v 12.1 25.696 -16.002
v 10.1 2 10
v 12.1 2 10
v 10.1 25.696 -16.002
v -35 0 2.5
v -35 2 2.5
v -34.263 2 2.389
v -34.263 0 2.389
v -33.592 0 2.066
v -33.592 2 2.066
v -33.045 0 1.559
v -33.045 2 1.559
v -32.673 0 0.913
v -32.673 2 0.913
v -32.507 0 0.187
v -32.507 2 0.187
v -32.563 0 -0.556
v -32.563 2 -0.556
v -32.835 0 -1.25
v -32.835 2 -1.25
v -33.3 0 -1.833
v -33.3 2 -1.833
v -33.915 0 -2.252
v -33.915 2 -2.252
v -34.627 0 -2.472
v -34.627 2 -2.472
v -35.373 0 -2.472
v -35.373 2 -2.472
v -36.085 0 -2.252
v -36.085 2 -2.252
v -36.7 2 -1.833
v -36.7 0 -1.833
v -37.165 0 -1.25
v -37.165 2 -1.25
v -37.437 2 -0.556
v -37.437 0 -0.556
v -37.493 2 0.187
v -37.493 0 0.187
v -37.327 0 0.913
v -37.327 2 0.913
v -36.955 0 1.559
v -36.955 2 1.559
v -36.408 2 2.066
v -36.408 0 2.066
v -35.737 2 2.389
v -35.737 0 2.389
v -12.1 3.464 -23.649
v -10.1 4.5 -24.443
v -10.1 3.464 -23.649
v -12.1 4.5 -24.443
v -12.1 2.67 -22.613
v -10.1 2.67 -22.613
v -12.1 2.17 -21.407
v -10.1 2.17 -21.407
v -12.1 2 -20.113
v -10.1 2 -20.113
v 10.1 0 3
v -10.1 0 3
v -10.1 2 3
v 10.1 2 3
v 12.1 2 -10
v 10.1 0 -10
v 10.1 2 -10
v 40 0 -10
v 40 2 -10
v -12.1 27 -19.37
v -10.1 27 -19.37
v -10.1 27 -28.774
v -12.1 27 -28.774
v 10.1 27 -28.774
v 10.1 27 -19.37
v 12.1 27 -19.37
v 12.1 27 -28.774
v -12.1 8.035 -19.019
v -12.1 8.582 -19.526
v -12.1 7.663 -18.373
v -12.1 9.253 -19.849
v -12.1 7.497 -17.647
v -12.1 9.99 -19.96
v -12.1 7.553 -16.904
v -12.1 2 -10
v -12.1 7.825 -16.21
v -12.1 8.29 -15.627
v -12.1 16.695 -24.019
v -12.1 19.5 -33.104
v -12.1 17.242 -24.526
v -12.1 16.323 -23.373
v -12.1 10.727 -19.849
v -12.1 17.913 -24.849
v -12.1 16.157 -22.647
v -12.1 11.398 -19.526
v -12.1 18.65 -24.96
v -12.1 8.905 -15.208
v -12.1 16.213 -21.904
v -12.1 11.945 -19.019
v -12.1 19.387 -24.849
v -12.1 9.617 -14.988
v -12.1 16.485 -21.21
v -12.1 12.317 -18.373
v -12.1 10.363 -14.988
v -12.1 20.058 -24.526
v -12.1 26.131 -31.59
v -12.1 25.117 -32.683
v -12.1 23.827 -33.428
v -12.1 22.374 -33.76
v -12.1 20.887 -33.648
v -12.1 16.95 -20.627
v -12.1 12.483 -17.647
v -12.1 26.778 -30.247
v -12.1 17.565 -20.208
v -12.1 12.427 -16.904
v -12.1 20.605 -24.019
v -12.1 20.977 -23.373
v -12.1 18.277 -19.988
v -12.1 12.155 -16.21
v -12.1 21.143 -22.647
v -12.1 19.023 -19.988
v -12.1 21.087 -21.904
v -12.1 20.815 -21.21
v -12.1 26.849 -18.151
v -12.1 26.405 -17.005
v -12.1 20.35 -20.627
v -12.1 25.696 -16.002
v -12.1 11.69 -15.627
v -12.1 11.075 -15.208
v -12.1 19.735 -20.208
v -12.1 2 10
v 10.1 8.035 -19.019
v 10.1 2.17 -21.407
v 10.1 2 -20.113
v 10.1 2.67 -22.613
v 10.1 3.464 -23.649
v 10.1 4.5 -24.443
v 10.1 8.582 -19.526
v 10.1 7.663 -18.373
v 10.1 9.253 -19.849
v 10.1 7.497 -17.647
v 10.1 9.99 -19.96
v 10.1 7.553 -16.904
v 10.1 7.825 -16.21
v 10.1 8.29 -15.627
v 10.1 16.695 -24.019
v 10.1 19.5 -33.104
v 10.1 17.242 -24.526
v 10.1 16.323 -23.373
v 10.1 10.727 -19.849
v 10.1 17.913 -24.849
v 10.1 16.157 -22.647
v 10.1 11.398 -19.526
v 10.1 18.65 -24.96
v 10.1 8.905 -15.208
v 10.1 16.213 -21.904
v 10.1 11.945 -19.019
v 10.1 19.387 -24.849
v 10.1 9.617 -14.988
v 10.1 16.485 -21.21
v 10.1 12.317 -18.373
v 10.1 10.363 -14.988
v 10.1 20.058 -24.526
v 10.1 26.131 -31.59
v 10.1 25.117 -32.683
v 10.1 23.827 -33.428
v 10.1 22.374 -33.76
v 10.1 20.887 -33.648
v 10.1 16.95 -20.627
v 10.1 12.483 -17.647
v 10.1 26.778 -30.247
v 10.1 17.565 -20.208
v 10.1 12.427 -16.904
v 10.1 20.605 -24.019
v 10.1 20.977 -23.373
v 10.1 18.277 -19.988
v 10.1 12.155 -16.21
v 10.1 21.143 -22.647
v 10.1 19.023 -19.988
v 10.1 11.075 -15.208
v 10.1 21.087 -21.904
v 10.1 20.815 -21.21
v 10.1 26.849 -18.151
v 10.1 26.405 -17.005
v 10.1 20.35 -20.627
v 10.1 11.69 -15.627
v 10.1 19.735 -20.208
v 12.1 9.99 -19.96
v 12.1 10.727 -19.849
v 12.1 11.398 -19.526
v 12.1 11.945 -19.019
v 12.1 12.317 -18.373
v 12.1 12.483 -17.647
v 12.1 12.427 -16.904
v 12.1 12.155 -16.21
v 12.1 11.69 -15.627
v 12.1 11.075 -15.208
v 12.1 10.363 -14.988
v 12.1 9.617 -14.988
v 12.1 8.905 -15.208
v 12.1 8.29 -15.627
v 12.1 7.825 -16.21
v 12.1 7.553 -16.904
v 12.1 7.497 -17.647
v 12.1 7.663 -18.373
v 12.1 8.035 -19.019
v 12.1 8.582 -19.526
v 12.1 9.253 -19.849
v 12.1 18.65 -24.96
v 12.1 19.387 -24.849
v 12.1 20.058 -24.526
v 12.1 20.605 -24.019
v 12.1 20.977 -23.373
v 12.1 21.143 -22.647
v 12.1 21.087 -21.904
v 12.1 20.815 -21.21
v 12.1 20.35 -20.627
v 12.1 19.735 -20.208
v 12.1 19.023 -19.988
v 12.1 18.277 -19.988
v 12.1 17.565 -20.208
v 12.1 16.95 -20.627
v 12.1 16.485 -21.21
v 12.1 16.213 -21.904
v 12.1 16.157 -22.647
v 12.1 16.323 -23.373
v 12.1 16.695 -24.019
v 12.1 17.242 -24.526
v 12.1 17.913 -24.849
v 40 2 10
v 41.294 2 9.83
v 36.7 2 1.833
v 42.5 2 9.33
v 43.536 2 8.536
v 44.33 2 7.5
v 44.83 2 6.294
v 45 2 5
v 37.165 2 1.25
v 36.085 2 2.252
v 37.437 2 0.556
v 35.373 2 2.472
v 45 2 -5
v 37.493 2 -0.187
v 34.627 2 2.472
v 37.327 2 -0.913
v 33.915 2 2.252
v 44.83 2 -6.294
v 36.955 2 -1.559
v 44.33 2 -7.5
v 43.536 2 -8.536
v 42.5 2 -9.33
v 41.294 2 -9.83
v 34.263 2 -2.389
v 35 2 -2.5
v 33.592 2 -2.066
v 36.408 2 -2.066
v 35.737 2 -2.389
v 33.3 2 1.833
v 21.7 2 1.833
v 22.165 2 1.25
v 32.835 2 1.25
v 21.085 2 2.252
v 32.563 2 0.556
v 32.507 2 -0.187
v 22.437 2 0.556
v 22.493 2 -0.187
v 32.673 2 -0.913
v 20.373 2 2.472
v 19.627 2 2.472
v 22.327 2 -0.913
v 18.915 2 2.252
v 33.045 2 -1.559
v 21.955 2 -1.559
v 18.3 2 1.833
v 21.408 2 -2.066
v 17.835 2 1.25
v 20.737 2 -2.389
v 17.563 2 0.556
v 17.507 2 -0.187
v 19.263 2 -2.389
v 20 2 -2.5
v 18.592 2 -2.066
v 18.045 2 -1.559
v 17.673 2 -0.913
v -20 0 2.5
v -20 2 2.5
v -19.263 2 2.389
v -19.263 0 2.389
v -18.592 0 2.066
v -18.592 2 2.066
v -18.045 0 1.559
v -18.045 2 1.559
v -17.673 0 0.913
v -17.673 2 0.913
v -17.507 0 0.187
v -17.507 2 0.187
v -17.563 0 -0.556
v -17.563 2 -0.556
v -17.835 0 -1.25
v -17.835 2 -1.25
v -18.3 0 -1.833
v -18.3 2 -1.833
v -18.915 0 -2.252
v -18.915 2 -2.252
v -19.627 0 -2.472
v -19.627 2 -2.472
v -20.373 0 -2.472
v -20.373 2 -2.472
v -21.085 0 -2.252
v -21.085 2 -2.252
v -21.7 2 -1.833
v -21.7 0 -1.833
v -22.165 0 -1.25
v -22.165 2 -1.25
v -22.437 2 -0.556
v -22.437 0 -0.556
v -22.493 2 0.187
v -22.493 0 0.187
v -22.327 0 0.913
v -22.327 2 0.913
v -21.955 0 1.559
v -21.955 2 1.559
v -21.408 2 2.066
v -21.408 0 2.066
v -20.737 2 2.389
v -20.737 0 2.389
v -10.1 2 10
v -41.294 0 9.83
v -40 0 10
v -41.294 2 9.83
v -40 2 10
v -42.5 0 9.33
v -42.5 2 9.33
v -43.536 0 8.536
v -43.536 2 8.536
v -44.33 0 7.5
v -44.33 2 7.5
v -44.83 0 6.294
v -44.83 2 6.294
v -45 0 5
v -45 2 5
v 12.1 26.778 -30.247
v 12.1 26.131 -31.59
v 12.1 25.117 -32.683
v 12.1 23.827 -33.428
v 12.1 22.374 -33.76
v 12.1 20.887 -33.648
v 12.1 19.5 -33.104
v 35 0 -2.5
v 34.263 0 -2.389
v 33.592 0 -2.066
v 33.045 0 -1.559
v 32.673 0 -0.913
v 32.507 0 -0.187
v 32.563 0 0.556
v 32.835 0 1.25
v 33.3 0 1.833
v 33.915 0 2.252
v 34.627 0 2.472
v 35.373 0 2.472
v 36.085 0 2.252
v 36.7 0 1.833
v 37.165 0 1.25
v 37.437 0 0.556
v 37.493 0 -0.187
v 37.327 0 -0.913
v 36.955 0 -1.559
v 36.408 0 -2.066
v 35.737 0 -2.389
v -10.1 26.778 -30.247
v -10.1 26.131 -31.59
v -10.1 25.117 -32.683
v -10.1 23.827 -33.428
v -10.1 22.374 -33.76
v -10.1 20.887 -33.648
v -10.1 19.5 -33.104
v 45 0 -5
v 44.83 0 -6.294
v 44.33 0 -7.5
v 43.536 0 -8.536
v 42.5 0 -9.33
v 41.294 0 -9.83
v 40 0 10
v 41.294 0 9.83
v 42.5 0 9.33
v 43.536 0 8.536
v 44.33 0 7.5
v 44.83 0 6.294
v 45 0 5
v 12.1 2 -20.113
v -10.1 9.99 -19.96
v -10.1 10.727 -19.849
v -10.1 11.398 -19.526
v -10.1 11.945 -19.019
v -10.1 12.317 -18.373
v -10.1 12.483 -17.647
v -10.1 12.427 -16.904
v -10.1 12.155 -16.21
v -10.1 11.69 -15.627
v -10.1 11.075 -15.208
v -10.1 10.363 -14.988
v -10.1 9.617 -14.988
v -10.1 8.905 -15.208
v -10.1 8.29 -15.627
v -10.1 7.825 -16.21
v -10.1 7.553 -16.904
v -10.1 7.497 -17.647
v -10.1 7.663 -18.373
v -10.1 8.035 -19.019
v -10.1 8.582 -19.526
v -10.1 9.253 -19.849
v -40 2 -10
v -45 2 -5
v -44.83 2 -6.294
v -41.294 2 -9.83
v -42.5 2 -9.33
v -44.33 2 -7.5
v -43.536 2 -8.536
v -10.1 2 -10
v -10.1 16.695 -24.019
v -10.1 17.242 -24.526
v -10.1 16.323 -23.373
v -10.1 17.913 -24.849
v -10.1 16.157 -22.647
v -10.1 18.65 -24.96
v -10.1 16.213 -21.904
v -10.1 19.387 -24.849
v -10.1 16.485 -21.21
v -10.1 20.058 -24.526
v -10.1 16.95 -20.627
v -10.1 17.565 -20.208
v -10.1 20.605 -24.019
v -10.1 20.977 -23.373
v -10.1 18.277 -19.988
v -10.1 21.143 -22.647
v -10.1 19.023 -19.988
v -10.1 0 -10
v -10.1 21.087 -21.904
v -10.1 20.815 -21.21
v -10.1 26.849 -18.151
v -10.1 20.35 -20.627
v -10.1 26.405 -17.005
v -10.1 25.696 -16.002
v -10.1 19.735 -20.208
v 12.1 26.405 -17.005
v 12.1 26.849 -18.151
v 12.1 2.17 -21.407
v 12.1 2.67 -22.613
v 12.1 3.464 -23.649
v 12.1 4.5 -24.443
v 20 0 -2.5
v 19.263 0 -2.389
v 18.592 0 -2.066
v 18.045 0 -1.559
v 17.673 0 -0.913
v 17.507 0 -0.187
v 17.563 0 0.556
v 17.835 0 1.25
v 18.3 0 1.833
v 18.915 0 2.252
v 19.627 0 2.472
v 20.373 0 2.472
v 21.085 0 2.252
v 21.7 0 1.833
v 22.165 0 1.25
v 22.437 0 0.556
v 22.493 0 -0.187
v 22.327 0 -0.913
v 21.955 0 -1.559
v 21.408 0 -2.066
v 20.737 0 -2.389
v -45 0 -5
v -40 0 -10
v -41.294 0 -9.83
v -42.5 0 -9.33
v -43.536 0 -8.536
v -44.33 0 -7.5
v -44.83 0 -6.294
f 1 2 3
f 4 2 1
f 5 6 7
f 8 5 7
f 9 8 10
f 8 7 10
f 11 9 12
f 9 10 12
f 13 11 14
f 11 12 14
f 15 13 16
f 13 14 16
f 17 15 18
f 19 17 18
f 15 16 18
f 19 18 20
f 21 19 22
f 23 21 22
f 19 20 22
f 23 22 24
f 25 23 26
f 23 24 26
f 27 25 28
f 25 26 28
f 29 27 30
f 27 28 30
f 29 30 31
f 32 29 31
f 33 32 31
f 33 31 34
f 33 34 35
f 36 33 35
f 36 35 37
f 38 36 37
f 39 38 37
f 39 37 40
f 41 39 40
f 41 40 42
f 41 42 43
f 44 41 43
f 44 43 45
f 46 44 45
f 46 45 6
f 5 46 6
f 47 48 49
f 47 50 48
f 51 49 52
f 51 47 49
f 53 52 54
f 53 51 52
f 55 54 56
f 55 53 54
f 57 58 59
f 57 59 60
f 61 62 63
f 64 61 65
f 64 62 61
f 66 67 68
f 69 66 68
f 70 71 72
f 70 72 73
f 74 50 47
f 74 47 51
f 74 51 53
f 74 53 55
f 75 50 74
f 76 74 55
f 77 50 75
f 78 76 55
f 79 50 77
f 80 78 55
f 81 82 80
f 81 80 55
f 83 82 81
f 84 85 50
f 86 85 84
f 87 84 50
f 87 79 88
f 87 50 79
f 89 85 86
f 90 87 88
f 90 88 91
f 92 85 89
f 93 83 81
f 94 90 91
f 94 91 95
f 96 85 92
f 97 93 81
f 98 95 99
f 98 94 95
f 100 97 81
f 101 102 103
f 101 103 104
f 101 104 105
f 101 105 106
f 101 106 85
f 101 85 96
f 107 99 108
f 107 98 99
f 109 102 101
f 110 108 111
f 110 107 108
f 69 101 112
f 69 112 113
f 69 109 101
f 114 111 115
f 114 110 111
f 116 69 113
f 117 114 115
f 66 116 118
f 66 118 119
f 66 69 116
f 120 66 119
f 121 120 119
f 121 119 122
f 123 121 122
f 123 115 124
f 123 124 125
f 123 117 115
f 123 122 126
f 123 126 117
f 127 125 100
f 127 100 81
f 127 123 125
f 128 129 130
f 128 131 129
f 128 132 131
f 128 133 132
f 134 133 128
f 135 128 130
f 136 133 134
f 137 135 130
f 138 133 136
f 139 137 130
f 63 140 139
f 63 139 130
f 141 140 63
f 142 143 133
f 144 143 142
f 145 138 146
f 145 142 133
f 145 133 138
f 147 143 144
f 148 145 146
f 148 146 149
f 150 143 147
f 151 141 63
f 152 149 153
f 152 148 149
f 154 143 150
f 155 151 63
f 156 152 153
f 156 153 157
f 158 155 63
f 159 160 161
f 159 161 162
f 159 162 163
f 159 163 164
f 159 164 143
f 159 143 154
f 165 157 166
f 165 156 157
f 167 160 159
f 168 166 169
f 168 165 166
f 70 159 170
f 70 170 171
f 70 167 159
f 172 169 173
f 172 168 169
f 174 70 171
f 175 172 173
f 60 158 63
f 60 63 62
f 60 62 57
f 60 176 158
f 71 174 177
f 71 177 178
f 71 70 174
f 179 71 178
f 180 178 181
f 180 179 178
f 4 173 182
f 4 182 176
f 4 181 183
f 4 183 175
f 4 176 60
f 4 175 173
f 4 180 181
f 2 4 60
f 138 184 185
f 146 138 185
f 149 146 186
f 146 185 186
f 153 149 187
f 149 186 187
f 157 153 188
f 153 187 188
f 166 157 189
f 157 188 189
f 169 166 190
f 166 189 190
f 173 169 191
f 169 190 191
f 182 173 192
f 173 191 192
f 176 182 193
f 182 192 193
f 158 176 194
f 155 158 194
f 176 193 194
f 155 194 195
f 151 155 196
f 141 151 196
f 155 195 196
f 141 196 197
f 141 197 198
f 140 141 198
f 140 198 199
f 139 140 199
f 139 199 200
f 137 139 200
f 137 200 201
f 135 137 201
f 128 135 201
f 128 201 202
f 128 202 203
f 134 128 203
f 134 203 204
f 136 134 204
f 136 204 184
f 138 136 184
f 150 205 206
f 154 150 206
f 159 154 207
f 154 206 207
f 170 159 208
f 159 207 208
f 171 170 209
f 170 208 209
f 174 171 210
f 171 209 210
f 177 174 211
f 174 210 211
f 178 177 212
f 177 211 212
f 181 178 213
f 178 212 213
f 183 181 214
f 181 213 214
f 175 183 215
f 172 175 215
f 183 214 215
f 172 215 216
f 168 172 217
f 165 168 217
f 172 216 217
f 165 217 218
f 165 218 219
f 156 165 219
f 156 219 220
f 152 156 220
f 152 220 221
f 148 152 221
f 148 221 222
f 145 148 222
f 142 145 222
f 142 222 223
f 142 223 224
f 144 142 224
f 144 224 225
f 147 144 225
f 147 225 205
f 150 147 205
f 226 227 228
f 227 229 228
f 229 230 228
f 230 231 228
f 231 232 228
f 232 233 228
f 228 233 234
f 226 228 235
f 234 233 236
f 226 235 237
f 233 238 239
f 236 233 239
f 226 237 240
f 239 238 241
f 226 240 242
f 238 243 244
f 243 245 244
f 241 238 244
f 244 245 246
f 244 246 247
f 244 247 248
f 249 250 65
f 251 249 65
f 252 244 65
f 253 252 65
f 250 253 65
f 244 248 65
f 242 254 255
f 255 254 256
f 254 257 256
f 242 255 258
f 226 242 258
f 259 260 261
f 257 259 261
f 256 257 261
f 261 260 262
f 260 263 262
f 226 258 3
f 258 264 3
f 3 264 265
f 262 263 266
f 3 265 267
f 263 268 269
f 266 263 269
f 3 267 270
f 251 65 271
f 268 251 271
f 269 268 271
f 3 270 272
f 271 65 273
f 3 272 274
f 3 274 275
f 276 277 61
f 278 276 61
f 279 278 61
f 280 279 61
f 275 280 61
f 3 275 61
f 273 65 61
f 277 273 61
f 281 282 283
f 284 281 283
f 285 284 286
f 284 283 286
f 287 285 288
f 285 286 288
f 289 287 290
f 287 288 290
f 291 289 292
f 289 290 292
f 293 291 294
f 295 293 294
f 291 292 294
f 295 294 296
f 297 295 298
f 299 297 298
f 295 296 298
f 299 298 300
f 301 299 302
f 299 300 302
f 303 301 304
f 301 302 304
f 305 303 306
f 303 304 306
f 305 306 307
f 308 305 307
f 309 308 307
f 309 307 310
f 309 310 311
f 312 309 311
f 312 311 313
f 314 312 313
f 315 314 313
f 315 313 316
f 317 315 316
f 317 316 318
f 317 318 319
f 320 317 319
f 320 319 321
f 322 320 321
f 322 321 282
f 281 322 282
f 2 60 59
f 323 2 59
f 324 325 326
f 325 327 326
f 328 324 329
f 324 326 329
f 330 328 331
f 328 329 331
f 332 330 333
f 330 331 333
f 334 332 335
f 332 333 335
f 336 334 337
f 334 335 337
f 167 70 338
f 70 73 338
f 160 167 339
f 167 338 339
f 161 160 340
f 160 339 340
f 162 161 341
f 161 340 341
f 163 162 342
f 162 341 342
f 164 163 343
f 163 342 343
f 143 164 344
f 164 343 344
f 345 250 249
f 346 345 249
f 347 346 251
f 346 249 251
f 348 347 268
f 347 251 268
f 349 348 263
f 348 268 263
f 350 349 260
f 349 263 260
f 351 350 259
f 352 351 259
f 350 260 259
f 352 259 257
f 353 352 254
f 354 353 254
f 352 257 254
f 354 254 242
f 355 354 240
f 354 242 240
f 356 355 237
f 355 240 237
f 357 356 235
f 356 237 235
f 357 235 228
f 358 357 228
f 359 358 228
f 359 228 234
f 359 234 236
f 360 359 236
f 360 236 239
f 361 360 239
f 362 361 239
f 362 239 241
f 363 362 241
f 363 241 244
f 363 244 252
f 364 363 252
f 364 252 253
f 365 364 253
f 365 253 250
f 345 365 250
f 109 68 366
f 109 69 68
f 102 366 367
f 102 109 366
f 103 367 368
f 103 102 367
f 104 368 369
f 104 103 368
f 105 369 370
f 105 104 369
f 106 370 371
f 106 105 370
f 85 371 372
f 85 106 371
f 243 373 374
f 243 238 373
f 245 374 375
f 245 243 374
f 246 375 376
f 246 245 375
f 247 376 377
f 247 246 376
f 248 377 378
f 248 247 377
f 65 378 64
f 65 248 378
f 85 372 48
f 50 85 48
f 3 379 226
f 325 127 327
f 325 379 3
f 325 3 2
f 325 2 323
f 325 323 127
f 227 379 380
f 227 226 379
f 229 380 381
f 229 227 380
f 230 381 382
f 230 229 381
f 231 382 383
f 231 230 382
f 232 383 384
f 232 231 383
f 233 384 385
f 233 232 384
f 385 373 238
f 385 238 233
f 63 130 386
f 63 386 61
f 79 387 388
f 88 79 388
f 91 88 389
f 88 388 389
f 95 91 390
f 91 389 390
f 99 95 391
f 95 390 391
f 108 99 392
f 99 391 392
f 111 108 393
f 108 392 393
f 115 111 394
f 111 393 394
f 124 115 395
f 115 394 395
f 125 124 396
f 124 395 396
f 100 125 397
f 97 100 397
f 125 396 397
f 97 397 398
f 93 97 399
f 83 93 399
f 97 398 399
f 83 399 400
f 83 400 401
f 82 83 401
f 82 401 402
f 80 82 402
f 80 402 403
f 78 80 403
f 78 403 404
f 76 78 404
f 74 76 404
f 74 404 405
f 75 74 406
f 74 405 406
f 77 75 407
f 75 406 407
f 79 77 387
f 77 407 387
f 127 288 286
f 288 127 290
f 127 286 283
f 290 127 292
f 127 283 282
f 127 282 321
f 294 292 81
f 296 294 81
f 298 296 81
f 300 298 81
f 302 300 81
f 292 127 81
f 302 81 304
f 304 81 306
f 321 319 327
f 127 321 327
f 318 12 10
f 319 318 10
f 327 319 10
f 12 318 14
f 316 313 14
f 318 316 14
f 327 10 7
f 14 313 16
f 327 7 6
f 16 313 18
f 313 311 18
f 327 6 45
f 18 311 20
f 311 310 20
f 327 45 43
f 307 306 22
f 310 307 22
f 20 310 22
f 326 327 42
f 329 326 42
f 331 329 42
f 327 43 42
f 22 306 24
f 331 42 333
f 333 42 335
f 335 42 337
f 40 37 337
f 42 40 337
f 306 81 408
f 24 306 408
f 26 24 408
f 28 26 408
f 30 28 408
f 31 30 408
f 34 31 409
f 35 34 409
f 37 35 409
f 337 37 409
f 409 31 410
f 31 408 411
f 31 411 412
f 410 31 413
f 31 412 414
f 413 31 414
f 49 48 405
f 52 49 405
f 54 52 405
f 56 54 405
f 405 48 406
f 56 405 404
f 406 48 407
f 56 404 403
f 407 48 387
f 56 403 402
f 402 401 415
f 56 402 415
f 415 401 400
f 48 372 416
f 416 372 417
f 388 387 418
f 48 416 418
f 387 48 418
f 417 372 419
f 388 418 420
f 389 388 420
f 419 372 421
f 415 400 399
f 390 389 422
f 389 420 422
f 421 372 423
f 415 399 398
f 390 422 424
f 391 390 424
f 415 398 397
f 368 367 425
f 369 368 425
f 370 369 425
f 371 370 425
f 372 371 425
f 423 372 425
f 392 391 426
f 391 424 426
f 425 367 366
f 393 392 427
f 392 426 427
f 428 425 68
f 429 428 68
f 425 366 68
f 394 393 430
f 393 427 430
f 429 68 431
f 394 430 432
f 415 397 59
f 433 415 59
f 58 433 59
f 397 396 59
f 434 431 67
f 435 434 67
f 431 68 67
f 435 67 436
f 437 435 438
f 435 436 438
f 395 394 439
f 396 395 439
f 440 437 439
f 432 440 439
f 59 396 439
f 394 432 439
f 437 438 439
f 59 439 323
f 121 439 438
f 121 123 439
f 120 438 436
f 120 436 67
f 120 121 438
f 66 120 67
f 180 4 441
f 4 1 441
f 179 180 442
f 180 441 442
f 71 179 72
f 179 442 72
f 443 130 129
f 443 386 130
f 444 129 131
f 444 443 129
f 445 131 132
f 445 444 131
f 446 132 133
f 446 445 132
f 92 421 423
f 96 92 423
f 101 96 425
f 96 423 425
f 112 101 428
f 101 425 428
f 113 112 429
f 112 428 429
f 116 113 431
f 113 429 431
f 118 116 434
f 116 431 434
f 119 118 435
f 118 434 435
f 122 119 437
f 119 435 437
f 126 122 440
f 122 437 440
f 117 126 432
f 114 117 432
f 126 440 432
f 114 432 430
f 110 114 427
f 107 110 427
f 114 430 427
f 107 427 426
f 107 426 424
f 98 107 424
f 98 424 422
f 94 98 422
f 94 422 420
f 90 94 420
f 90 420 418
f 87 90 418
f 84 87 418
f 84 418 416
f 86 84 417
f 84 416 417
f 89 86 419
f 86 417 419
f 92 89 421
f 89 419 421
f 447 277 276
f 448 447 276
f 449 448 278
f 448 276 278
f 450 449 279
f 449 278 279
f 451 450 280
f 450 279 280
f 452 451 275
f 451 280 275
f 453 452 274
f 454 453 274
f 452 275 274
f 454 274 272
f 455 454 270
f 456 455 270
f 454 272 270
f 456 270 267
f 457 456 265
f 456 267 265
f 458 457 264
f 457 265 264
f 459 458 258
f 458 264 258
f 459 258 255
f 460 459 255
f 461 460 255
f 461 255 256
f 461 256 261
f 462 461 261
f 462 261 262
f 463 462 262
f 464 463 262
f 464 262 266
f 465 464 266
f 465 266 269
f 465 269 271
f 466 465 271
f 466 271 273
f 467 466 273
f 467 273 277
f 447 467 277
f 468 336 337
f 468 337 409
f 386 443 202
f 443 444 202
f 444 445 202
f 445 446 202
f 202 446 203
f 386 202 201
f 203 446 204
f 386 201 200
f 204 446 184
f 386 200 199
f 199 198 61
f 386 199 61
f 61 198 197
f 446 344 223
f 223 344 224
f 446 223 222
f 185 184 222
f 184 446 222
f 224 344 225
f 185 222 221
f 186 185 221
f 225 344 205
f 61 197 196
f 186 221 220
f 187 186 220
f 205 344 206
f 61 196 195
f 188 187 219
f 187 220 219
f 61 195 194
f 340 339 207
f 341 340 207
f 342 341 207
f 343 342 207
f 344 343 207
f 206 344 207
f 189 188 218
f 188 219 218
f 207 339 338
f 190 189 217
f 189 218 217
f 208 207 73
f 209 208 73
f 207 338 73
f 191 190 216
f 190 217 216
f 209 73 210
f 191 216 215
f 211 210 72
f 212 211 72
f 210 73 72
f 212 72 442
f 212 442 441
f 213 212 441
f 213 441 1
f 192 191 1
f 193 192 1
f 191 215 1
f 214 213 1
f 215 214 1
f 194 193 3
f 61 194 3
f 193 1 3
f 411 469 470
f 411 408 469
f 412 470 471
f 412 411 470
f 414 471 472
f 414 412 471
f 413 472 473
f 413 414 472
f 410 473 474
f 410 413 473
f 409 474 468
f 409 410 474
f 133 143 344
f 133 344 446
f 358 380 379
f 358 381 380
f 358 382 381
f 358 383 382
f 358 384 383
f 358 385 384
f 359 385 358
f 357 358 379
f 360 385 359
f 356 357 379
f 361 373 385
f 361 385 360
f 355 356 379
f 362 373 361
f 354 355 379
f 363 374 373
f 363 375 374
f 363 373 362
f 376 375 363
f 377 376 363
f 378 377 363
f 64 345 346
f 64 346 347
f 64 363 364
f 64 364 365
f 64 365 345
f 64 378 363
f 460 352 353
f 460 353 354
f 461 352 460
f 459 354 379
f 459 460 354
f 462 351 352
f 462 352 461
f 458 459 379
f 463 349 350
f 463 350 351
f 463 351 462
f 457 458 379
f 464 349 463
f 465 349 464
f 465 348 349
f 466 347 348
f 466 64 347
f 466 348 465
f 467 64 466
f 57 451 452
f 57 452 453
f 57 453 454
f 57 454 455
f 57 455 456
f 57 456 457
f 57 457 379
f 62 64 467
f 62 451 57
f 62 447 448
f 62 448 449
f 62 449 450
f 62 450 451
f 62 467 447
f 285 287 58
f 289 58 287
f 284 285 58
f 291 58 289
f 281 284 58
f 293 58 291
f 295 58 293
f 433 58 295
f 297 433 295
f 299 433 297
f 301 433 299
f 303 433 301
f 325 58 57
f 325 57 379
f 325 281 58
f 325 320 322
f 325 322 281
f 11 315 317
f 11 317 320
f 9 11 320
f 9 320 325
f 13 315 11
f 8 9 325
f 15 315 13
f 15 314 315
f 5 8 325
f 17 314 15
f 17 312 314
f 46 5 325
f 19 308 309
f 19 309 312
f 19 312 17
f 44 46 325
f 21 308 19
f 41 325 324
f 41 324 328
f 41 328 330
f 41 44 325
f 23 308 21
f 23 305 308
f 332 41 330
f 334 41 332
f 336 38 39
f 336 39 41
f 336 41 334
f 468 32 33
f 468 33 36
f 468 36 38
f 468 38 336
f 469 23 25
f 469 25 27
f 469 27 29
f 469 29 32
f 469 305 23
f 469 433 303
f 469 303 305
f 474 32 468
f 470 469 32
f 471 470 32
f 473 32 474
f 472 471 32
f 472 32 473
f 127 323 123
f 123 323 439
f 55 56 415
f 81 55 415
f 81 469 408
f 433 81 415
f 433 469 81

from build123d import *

# Parameters (mm, degrees)
BOSS_EXTRUDE1_DEPTH = 2
SKETCH2_R           = 2.5
CUT_EXTRUDE1_DEPTH  = 47.14108798
BOSS_EXTRUDE2_DEPTH = 2
SKETCH4_R           = 2.5
CUT_EXTRUDE2_DEPTH  = 74.421360263
SKETCH5_R           = 2.5
BOSS_EXTRUDE3_DEPTH = 2
FILLET1_R           = 5
FILLET2_R           = 5


with BuildPart() as part:
    # Sketch1 → Boss-Extrude1 (new body)
    with BuildSketch(Plane(origin=(0, 0, 0), x_dir=(1, 0, 0), z_dir=(0, 1, 0))):
        Polygon((-10.1, 10), (-10.1, 0), (-10.1, -3), (10.1, -3), (10.1, 0), (10.1, 10), (45, 10), (45, -10), (-45, -10), (-45, 10), align=None)
    extrude(amount=BOSS_EXTRUDE1_DEPTH)

    # Sketch2 → Cut-Extrude1 (cut, through all)
    with BuildSketch(Plane(origin=(0, 2, 0), x_dir=(1, 0, 0), z_dir=(0, 1, 0))):
        with Locations(Location((-20, 0, 0), (0, 0, 270))):
            Circle(SKETCH2_R)
        with Locations(Location((-35, 0, 0), (0, 0, 270))):
            Circle(SKETCH2_R)
        with Locations(Location((20, 0, 0), (0, 0, 90))):
            Circle(SKETCH2_R)
        with Locations(Location((35, 0, 0), (0, 0, 90))):
            Circle(SKETCH2_R)
    extrude(amount=-CUT_EXTRUDE1_DEPTH, mode=Mode.SUBTRACT)

    # Sketch3 → Boss-Extrude2 (add)
    with BuildSketch(Plane.ZY.offset(-10.1)):
        Polygon((10, 2), (-17.43375673, 27), (-37.43375673, 27), (-23, 2), align=None)
    extrude(amount=-BOSS_EXTRUDE2_DEPTH)

    # Sketch4 → Cut-Extrude2 (cut, through all)
    with BuildSketch(Plane(origin=(12.1, 0, 0), x_dir=(0, 0, -1), z_dir=(1, 0, 0))):
        with Locations((22.46, 18.65)):
            Circle(SKETCH4_R)
        with Locations((17.46, 9.99)):
            Circle(SKETCH4_R)
    extrude(amount=-CUT_EXTRUDE2_DEPTH, mode=Mode.SUBTRACT)

    # Sketch5 → Boss-Extrude3 (add)
    with BuildSketch(Plane(origin=(-10.1, 0, 0), x_dir=(0, 0, -1), z_dir=(1, 0, 0))):
        Polygon((-10, 2), (17.43375673, 27), (37.43375673, 27), (23, 2), align=None)
        with Locations((22.46, 18.65)):
            Circle(SKETCH5_R, mode=Mode.SUBTRACT)
        with Locations((17.46, 9.99)):
            Circle(SKETCH5_R, mode=Mode.SUBTRACT)
    extrude(amount=-BOSS_EXTRUDE3_DEPTH)

    # Fillet1
    fillet1_edges = [part.edges().sort_by_distance(p)[0] for p in [
        (11.1, 2, -23),
        (11.1, 27, -37.43375673),
        (11.1, 27, -17.43375673),
        (-11.1, 2, -23),
        (-11.1, 27, -17.43375673),
        (-11.1, 27, -37.43375673),
    ]]
    fillet(fillet1_edges, radius=FILLET1_R)

    # Fillet2
    fillet2_edges = [part.edges().sort_by_distance(p)[0] for p in [
        (45, 1, 10),
        (-45, 1, 10),
        (-45, 1, -10),
        (45, 1, -10),
    ]]
    fillet(fillet2_edges, radius=FILLET2_R)


solid = part.part
